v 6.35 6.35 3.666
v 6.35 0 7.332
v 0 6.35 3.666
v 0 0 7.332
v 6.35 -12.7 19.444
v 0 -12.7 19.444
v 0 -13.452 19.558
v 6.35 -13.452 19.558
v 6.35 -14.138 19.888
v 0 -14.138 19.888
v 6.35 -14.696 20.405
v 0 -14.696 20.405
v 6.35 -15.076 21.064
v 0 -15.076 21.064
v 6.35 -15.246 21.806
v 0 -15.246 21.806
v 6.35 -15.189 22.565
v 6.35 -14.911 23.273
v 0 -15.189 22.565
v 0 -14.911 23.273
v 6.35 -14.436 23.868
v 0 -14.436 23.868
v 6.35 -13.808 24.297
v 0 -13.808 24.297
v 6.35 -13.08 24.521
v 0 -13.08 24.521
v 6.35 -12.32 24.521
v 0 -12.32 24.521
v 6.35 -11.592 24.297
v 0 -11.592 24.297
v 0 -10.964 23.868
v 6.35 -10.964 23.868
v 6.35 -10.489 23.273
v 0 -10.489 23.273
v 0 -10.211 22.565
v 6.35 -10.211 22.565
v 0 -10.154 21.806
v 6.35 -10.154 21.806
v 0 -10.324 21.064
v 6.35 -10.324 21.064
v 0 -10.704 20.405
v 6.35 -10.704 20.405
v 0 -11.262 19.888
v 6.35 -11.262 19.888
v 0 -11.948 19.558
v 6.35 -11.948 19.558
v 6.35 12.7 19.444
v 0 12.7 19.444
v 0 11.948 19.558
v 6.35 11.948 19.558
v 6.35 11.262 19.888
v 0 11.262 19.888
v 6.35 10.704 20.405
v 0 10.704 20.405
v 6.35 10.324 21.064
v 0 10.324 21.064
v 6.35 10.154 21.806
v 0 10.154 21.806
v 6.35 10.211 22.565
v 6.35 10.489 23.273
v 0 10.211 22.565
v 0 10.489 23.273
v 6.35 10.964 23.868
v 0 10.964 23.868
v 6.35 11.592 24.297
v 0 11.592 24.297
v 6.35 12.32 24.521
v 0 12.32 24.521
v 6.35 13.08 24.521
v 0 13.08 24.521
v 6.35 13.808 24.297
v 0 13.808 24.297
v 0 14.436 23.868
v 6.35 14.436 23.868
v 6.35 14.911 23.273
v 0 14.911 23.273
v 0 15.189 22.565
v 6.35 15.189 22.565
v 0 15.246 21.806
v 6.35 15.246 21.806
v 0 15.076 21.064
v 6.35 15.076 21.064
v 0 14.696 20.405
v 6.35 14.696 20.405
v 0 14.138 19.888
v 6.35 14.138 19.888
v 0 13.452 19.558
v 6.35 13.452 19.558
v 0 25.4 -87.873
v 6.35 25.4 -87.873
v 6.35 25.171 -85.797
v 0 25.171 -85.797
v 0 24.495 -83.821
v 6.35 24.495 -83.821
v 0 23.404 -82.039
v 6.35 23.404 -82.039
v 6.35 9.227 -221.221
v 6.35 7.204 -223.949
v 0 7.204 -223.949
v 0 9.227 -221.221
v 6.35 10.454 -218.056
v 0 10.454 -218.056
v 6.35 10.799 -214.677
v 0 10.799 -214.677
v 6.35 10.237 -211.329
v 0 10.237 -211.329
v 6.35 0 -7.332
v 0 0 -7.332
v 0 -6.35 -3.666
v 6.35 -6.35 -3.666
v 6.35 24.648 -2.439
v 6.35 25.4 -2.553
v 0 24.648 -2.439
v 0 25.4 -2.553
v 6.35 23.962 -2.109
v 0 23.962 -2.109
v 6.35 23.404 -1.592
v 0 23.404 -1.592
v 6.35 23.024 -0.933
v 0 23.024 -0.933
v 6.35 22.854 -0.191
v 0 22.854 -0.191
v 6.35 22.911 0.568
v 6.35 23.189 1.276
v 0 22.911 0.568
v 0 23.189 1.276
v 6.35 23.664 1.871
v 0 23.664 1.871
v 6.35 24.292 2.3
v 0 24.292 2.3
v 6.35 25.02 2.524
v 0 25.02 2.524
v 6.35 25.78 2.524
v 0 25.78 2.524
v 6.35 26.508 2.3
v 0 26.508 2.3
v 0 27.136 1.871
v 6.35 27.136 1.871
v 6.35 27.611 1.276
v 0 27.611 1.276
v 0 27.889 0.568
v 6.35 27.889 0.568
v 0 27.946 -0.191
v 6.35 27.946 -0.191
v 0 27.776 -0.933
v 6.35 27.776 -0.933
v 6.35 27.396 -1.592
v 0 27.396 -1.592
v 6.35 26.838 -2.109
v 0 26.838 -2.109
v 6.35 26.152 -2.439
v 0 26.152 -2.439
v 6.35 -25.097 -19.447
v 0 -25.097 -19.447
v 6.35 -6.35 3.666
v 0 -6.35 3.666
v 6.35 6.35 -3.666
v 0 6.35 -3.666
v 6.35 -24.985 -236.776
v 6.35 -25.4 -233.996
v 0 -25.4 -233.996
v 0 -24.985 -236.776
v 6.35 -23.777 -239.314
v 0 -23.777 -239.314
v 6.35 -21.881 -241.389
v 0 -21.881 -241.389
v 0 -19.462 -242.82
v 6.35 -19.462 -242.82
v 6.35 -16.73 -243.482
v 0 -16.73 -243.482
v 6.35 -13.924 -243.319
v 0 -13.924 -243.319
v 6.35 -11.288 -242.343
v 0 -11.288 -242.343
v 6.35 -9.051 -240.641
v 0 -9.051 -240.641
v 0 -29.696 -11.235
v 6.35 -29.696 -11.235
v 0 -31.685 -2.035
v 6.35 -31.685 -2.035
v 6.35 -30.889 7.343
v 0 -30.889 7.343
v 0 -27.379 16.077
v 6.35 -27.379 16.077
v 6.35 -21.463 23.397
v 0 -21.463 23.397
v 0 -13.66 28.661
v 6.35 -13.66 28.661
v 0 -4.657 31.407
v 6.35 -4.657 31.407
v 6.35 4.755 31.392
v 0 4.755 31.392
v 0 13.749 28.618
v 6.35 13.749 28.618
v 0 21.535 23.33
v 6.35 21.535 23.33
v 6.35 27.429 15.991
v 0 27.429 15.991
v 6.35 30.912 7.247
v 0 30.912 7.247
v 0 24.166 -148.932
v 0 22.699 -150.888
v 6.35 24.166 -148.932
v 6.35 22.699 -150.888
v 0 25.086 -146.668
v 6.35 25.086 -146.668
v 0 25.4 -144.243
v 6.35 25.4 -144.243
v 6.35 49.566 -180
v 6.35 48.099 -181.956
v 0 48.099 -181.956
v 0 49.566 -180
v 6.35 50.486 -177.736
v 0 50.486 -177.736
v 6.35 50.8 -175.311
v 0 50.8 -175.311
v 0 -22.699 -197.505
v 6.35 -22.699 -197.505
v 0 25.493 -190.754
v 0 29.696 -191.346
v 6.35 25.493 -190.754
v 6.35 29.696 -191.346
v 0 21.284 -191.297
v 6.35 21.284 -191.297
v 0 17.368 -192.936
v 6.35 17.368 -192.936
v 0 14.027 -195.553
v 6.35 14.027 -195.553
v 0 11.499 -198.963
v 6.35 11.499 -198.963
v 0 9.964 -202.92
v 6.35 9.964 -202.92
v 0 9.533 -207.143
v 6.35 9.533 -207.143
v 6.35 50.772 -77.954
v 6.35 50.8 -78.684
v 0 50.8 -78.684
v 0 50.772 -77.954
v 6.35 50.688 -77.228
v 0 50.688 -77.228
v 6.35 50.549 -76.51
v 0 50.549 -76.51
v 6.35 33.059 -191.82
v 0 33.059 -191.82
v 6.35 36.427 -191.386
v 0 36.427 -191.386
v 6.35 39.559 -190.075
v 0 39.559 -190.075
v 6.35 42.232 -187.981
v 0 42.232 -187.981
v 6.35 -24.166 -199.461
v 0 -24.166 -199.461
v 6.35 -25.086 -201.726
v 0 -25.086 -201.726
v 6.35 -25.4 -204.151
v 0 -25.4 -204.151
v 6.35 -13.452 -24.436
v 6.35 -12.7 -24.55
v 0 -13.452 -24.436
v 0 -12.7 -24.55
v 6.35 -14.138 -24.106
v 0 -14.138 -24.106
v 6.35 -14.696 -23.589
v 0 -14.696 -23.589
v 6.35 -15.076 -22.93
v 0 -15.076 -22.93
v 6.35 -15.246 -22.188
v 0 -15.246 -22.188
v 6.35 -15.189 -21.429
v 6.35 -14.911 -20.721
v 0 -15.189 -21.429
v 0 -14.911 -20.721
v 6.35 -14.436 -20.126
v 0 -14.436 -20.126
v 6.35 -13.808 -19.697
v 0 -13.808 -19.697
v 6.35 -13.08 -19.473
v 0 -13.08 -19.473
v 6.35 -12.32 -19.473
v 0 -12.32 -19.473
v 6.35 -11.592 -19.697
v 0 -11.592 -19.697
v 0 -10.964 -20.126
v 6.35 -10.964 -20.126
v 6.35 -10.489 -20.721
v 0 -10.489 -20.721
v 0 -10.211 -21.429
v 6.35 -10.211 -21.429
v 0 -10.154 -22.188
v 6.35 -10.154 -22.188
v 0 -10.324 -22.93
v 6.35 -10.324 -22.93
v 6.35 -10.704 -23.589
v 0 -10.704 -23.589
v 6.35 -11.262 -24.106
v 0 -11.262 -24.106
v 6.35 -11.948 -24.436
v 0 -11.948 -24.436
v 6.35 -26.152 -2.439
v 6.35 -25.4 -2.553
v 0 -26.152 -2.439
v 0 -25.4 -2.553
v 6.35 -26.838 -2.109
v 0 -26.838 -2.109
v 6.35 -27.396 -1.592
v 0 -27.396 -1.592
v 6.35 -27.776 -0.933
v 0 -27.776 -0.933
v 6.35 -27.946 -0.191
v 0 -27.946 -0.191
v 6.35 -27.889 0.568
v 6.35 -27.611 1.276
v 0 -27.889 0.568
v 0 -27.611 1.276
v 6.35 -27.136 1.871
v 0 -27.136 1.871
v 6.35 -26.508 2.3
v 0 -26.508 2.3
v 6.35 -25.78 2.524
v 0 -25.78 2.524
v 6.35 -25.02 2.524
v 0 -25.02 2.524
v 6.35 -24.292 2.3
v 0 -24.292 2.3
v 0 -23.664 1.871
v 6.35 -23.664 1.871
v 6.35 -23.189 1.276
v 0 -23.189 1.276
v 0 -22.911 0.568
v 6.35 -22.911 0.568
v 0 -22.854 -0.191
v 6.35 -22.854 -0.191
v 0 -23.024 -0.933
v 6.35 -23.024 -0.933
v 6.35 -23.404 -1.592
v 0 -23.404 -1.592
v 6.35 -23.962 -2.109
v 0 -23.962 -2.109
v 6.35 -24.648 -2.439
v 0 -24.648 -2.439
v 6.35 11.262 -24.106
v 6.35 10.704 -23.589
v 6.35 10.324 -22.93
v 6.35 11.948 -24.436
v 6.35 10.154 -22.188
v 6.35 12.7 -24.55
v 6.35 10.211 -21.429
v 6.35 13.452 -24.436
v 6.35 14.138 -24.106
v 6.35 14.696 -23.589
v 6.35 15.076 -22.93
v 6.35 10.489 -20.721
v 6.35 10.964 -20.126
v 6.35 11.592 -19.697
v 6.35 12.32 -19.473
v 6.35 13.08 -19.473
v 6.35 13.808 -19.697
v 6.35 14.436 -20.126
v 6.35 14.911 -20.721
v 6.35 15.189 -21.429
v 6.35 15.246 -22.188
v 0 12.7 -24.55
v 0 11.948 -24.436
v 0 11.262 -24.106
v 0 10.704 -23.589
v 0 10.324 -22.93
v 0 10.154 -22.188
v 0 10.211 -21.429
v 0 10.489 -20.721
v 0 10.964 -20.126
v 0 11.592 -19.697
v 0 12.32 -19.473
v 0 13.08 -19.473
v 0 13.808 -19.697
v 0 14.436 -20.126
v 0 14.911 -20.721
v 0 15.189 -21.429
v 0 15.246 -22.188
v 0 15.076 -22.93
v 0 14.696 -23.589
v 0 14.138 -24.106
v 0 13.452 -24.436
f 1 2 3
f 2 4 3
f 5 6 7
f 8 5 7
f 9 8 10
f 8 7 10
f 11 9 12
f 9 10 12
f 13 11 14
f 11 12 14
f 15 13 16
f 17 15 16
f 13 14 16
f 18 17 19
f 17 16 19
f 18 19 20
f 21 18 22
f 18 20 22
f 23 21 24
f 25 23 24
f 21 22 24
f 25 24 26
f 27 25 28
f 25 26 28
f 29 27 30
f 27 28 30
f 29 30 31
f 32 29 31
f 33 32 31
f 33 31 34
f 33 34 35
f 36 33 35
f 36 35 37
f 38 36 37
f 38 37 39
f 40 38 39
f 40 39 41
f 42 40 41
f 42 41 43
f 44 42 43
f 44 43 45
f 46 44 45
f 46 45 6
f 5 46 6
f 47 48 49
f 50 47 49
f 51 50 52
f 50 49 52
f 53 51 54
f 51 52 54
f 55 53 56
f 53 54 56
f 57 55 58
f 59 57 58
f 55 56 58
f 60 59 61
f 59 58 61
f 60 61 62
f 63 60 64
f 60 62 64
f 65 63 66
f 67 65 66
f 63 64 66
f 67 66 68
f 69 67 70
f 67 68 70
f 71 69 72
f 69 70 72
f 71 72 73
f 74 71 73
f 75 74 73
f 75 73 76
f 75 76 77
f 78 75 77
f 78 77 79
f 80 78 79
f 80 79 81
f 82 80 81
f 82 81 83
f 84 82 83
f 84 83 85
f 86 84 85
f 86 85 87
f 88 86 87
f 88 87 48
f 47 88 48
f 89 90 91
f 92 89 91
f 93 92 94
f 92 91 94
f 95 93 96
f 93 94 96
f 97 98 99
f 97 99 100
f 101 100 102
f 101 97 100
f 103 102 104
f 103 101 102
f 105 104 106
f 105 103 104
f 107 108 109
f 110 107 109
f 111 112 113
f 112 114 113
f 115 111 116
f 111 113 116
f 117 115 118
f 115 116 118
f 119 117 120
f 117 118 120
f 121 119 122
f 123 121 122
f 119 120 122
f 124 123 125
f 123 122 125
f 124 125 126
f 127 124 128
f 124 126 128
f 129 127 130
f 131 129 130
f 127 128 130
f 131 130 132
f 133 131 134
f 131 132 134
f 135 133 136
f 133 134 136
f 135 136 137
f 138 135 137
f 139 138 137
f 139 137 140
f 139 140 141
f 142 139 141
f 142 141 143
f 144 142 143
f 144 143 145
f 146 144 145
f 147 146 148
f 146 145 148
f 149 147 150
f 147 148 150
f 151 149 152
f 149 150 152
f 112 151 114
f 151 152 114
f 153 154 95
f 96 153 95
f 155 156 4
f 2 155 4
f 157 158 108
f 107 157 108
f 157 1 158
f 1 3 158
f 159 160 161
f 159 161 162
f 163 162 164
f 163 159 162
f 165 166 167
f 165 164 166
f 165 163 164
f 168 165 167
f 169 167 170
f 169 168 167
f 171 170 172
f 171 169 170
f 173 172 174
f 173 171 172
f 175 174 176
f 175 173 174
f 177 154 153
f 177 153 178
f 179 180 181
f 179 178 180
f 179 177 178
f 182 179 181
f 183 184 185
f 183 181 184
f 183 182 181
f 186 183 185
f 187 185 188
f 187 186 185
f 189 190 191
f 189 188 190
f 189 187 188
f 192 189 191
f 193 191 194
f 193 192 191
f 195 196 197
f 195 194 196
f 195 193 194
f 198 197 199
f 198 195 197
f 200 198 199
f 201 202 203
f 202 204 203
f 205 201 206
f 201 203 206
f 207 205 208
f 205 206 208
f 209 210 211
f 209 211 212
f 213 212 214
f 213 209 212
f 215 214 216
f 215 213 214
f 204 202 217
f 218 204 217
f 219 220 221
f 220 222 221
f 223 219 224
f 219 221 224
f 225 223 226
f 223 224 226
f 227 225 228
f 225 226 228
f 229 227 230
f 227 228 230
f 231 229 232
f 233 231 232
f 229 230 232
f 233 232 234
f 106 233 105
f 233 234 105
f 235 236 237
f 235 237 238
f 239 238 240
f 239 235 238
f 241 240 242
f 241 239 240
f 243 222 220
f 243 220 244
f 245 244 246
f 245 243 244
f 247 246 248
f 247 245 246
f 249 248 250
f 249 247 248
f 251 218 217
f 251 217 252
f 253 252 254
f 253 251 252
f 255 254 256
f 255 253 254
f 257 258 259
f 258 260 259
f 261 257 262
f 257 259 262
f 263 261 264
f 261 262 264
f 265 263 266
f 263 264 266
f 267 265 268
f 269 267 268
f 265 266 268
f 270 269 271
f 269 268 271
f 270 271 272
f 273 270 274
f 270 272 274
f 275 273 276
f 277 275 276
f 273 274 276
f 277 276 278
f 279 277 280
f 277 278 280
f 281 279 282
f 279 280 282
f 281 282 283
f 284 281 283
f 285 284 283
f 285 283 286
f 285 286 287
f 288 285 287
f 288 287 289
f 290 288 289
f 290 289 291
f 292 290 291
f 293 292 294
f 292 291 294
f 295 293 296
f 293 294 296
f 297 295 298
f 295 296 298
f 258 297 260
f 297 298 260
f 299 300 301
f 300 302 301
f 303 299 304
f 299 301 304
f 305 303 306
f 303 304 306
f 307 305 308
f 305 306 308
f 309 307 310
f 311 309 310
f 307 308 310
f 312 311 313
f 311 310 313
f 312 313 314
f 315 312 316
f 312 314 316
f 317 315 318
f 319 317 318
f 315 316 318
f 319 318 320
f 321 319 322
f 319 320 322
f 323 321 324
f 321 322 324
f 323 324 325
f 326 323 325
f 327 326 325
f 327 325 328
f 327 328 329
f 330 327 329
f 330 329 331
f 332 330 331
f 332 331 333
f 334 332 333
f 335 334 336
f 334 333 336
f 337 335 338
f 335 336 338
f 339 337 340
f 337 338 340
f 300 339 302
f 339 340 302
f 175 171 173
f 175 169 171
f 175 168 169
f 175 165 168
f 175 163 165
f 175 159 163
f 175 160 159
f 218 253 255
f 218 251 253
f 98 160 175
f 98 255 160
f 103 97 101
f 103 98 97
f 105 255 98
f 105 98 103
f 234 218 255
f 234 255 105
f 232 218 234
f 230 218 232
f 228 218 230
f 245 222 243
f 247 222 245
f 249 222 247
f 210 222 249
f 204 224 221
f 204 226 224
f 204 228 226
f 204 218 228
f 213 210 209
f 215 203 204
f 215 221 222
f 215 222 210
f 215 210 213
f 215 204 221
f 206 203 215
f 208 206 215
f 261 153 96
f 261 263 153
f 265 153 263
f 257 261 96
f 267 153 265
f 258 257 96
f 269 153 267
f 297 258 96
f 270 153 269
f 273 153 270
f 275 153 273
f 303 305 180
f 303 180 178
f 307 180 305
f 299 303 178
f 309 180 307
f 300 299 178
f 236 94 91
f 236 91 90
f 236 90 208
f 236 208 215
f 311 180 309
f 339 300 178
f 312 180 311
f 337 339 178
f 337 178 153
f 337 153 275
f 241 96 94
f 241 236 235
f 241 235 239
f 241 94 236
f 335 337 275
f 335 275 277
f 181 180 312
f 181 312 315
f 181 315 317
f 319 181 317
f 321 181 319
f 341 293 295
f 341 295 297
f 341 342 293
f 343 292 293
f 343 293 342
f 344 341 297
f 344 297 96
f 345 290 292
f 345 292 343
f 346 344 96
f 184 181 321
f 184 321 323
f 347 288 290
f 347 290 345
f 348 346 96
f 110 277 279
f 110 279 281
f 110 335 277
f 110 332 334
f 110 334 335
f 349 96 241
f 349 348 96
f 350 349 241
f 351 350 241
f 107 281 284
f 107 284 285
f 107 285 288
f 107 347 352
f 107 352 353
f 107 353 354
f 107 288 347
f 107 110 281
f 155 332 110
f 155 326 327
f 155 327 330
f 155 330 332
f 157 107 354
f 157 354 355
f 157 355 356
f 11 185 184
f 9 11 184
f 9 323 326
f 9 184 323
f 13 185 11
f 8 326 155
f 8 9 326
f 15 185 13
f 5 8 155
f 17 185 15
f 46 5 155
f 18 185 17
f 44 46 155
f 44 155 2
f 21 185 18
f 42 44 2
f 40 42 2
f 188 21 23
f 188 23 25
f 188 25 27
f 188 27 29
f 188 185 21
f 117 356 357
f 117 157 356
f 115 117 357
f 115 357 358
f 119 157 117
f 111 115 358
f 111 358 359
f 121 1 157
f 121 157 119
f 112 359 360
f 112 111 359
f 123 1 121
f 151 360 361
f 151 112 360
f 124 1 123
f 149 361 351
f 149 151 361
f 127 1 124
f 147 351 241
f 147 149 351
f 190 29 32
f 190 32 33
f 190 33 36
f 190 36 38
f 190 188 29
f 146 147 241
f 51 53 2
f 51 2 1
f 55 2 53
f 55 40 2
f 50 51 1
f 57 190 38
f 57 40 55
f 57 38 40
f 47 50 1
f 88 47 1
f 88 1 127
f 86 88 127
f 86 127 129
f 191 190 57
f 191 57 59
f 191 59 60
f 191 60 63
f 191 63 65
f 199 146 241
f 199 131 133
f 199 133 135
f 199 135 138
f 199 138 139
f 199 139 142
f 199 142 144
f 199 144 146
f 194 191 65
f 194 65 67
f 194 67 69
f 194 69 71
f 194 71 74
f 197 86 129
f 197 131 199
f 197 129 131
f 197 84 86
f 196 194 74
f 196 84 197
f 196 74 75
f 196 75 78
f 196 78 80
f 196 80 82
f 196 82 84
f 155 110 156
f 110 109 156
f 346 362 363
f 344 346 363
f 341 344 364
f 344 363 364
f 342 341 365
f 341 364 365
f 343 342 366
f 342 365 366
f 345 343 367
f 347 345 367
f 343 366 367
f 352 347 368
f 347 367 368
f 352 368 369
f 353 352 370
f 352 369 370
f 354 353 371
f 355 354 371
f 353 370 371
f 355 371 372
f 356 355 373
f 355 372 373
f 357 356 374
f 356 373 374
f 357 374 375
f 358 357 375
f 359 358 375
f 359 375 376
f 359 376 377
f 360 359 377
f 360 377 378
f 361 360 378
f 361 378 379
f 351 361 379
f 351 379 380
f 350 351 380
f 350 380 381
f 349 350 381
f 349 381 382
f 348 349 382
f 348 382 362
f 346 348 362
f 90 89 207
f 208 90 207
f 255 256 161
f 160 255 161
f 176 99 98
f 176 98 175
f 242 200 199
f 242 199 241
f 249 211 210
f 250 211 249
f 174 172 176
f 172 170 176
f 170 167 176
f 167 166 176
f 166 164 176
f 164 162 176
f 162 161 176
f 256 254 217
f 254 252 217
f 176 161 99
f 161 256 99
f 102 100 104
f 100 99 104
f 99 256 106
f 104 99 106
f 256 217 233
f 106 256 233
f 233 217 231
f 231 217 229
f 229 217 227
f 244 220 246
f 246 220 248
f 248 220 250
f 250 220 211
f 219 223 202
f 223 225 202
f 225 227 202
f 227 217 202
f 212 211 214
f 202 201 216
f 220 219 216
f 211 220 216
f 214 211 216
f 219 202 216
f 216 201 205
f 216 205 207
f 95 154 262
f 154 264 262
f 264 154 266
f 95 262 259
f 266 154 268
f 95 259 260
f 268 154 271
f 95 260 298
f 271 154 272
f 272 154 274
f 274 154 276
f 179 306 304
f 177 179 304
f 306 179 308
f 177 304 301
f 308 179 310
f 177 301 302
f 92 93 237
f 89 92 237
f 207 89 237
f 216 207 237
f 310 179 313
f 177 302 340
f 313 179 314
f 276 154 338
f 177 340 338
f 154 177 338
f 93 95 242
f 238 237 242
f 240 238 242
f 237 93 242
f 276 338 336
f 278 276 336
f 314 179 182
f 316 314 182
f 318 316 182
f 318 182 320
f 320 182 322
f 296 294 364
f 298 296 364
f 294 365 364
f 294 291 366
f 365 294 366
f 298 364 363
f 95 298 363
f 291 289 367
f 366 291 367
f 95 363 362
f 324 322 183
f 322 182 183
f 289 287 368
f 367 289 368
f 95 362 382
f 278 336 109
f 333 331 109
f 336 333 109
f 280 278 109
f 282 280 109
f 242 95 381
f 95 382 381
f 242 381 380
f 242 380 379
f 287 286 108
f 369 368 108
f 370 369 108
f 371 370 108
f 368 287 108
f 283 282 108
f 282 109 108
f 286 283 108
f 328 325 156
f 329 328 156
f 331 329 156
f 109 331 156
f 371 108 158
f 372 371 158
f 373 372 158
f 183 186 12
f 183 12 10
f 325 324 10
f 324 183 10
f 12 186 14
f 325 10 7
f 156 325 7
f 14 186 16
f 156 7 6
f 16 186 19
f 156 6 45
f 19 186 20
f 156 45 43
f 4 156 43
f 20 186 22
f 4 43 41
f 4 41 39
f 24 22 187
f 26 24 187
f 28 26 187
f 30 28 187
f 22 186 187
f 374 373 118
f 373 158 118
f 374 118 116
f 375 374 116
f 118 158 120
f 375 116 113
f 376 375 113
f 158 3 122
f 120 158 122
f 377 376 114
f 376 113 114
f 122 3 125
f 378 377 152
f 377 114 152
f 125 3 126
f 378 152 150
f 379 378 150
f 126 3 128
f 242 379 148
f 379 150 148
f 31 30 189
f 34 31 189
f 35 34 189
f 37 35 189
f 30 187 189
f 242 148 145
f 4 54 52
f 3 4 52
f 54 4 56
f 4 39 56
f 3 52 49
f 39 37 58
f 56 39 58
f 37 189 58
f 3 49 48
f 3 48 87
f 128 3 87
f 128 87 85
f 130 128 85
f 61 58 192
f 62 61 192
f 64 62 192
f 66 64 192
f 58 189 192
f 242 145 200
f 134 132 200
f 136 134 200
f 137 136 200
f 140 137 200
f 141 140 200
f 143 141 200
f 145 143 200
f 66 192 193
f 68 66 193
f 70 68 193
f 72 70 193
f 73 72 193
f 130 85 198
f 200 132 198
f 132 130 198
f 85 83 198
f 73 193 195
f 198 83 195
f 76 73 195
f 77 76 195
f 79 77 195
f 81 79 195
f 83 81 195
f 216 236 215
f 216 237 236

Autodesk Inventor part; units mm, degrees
ref_plane "YZ Plane" through (0, 0, 0) normal (1, 0, 0) x (0, 1, 0)
ref_plane "XZ Plane" through (0, 0, 0) normal (0, 1, 0) x (-1, 0, 0)
ref_plane "XY Plane" through (0, 0, 0) normal (0, 0, 1) x (1, 0, 0)
sketch "Sketch1" plane through (0, 0, 0) normal (1, 0, 0) x (0, 1, 0)
  circle A0 centre (0, 0) radius 31.75 construction
  line L0 (19.05, -103.6647) -> (-107.95, -103.6647) construction
  line L1 (-107.95, -103.6647) -> (-107.95, -162.179) construction
  line L2 (-107.95, -162.179) -> (19.05, -162.179) construction
  line L3 (19.05, -162.179) -> (19.05, -103.6647) construction
  line L4 (19.05, -103.6647) -> (-107.95, -162.179) construction
  line L5 (-107.95, -103.6647) -> (19.05, -162.179) construction
  line L6 (-25.4, -162.179) -> (-25.4, -365.379) construction
  point P0 (-44.45, -132.9219)
  dimension "d0" = 63.5
  dimension "d2" = 127
  dimension "d3" = 58.5143
  dimension "d4" = 19.05
  dimension "d5" = 162.179
  dimension "d6" = 203.2
  dimension "d7" = 25.4
sketch "Sketch2" plane through (0, 0, 0) normal (1, 0, 0) x (0, 1, 0)
  circle A0 centre (0, 0) radius 31.75 construction
  line L0 (19.05, -103.6647) -> (-107.95, -103.6647) construction
  line L1 (-107.95, -103.6647) -> (-107.95, -162.179) construction
  line L2 (-107.95, -162.179) -> (19.05, -162.179) construction
  line L3 (19.05, -162.179) -> (19.05, -103.6647) construction
  line L4 (19.05, -103.6647) -> (-107.95, -162.179) construction
  line L5 (-107.95, -103.6647) -> (19.05, -162.179) construction
  line L6 (-25.4, -162.179) -> (-25.4, -365.379) construction
  line L7 (-25.0971, -19.4473) -> (25.4, -84.6147)
  line L8 (25.4, -84.6147) -> (25.4, -148.1147)
  line L9 (25.4, -148.1147) -> (-25.4, -200.279)
  line L10 (30.9118, 7.2472) -> (50.8, -77.5826)
  line L11 (50.8, -77.5826) -> (50.8, -179.1826)
  line L12 (50.8, -179.1826) -> (-25.4, -257.429)
  arc A1 (30.9118, 7.2472) -> (-25.0971, -19.4473) centre (0, 0) ccw
  line L13 (6.35, 3.6662) -> (6.35, -3.6662)
  line L14 (6.35, -3.6662) -> (0, -7.3323)
  line L15 (0, -7.3323) -> (-6.35, -3.6662)
  line L16 (-6.35, -3.6662) -> (-6.35, 3.6662)
  line L17 (-6.35, 3.6662) -> (0, 7.3323)
  line L18 (0, 7.3323) -> (6.35, 3.6662)
  line L19 (-25.4, -200.279) -> (-25.4, -257.429)
  point P0 (-44.45, -132.9219)
  point P1 (25.4, -116.3647)
  point P2 (19.05, -132.9219)
  point P3 (-6.35, 0)
  dimension "d8" = 6.35
  dimension "d9" = 63.5
  dimension "d10" = 25.4
  dimension "d11" = 101.6
  dimension "d12" = 12.7
  dimension "d13" = 57.15
  dimension "d28" = 38.1
  dimension "d29" = 19.05
extrude "Extrusion1" add sketch "Sketch2" along normal blind 6.35
sketch "Sketch3" plane through (6.35, 0, 0) normal (1, 0, 0) x (0, 0, -1)
  circle A0 centre (0, 0) radius 25.4 construction
  point P0 (0, 25.4)
  point P1 (-21.997, 12.7)
  point P2 (-21.997, -12.7)
  point P3 (0, -25.4)
  point P4 (21.997, -12.7)
  point P5 (21.997, 12.7)
  dimension "d16" = 50.8
  dimension "d19" = 360
hole "Hole1" at (6.35, 25.4, 0) at (6.35, 12.7, 21.997) at (6.35, -12.7, 21.997) at (6.35, -25.4, 0) at (6.35, -12.7, -21.997) at (6.35, 12.7, -21.997) direction (-1, 0, 0) diameter 5.1054 end through all clearance for "Flat Head Machine Screw (82)" size "#10" standard "Ansi Unified Screw Threads"
sketch "Sketch4" plane through (6.35, 0, 0) normal (1, 0, 0) x (0, 0, -1)
  circle A0 centre (206.629, 25.4) radius 15.875
  line L0 (200.279, -25.4) -> (257.429, -25.4) construction
  point P0 (0, 0)
  dimension "d30" = 31.75
  dimension "d31" = 50.8
  dimension "d32" = 6.35
extrude "Extrusion2" cut sketch "Sketch4" against normal through all
fillet "Fillet1" radius 12.7 2 edges at (3.175, 35.7738, -194.6123) (3.175, 13.6624, -217.3175)
fillet "Fillet2" radius 9.525 6 edges at (3.175, -25.4, -257.429) (3.175, -25.4, -200.279) (3.175, 25.4, -148.1147) (3.175, 50.8, -179.1826) (3.175, 25.4, -84.6147) (3.175, 50.8, -77.5826)
properties part number "CL4-025" material "Aluminum 6061"
